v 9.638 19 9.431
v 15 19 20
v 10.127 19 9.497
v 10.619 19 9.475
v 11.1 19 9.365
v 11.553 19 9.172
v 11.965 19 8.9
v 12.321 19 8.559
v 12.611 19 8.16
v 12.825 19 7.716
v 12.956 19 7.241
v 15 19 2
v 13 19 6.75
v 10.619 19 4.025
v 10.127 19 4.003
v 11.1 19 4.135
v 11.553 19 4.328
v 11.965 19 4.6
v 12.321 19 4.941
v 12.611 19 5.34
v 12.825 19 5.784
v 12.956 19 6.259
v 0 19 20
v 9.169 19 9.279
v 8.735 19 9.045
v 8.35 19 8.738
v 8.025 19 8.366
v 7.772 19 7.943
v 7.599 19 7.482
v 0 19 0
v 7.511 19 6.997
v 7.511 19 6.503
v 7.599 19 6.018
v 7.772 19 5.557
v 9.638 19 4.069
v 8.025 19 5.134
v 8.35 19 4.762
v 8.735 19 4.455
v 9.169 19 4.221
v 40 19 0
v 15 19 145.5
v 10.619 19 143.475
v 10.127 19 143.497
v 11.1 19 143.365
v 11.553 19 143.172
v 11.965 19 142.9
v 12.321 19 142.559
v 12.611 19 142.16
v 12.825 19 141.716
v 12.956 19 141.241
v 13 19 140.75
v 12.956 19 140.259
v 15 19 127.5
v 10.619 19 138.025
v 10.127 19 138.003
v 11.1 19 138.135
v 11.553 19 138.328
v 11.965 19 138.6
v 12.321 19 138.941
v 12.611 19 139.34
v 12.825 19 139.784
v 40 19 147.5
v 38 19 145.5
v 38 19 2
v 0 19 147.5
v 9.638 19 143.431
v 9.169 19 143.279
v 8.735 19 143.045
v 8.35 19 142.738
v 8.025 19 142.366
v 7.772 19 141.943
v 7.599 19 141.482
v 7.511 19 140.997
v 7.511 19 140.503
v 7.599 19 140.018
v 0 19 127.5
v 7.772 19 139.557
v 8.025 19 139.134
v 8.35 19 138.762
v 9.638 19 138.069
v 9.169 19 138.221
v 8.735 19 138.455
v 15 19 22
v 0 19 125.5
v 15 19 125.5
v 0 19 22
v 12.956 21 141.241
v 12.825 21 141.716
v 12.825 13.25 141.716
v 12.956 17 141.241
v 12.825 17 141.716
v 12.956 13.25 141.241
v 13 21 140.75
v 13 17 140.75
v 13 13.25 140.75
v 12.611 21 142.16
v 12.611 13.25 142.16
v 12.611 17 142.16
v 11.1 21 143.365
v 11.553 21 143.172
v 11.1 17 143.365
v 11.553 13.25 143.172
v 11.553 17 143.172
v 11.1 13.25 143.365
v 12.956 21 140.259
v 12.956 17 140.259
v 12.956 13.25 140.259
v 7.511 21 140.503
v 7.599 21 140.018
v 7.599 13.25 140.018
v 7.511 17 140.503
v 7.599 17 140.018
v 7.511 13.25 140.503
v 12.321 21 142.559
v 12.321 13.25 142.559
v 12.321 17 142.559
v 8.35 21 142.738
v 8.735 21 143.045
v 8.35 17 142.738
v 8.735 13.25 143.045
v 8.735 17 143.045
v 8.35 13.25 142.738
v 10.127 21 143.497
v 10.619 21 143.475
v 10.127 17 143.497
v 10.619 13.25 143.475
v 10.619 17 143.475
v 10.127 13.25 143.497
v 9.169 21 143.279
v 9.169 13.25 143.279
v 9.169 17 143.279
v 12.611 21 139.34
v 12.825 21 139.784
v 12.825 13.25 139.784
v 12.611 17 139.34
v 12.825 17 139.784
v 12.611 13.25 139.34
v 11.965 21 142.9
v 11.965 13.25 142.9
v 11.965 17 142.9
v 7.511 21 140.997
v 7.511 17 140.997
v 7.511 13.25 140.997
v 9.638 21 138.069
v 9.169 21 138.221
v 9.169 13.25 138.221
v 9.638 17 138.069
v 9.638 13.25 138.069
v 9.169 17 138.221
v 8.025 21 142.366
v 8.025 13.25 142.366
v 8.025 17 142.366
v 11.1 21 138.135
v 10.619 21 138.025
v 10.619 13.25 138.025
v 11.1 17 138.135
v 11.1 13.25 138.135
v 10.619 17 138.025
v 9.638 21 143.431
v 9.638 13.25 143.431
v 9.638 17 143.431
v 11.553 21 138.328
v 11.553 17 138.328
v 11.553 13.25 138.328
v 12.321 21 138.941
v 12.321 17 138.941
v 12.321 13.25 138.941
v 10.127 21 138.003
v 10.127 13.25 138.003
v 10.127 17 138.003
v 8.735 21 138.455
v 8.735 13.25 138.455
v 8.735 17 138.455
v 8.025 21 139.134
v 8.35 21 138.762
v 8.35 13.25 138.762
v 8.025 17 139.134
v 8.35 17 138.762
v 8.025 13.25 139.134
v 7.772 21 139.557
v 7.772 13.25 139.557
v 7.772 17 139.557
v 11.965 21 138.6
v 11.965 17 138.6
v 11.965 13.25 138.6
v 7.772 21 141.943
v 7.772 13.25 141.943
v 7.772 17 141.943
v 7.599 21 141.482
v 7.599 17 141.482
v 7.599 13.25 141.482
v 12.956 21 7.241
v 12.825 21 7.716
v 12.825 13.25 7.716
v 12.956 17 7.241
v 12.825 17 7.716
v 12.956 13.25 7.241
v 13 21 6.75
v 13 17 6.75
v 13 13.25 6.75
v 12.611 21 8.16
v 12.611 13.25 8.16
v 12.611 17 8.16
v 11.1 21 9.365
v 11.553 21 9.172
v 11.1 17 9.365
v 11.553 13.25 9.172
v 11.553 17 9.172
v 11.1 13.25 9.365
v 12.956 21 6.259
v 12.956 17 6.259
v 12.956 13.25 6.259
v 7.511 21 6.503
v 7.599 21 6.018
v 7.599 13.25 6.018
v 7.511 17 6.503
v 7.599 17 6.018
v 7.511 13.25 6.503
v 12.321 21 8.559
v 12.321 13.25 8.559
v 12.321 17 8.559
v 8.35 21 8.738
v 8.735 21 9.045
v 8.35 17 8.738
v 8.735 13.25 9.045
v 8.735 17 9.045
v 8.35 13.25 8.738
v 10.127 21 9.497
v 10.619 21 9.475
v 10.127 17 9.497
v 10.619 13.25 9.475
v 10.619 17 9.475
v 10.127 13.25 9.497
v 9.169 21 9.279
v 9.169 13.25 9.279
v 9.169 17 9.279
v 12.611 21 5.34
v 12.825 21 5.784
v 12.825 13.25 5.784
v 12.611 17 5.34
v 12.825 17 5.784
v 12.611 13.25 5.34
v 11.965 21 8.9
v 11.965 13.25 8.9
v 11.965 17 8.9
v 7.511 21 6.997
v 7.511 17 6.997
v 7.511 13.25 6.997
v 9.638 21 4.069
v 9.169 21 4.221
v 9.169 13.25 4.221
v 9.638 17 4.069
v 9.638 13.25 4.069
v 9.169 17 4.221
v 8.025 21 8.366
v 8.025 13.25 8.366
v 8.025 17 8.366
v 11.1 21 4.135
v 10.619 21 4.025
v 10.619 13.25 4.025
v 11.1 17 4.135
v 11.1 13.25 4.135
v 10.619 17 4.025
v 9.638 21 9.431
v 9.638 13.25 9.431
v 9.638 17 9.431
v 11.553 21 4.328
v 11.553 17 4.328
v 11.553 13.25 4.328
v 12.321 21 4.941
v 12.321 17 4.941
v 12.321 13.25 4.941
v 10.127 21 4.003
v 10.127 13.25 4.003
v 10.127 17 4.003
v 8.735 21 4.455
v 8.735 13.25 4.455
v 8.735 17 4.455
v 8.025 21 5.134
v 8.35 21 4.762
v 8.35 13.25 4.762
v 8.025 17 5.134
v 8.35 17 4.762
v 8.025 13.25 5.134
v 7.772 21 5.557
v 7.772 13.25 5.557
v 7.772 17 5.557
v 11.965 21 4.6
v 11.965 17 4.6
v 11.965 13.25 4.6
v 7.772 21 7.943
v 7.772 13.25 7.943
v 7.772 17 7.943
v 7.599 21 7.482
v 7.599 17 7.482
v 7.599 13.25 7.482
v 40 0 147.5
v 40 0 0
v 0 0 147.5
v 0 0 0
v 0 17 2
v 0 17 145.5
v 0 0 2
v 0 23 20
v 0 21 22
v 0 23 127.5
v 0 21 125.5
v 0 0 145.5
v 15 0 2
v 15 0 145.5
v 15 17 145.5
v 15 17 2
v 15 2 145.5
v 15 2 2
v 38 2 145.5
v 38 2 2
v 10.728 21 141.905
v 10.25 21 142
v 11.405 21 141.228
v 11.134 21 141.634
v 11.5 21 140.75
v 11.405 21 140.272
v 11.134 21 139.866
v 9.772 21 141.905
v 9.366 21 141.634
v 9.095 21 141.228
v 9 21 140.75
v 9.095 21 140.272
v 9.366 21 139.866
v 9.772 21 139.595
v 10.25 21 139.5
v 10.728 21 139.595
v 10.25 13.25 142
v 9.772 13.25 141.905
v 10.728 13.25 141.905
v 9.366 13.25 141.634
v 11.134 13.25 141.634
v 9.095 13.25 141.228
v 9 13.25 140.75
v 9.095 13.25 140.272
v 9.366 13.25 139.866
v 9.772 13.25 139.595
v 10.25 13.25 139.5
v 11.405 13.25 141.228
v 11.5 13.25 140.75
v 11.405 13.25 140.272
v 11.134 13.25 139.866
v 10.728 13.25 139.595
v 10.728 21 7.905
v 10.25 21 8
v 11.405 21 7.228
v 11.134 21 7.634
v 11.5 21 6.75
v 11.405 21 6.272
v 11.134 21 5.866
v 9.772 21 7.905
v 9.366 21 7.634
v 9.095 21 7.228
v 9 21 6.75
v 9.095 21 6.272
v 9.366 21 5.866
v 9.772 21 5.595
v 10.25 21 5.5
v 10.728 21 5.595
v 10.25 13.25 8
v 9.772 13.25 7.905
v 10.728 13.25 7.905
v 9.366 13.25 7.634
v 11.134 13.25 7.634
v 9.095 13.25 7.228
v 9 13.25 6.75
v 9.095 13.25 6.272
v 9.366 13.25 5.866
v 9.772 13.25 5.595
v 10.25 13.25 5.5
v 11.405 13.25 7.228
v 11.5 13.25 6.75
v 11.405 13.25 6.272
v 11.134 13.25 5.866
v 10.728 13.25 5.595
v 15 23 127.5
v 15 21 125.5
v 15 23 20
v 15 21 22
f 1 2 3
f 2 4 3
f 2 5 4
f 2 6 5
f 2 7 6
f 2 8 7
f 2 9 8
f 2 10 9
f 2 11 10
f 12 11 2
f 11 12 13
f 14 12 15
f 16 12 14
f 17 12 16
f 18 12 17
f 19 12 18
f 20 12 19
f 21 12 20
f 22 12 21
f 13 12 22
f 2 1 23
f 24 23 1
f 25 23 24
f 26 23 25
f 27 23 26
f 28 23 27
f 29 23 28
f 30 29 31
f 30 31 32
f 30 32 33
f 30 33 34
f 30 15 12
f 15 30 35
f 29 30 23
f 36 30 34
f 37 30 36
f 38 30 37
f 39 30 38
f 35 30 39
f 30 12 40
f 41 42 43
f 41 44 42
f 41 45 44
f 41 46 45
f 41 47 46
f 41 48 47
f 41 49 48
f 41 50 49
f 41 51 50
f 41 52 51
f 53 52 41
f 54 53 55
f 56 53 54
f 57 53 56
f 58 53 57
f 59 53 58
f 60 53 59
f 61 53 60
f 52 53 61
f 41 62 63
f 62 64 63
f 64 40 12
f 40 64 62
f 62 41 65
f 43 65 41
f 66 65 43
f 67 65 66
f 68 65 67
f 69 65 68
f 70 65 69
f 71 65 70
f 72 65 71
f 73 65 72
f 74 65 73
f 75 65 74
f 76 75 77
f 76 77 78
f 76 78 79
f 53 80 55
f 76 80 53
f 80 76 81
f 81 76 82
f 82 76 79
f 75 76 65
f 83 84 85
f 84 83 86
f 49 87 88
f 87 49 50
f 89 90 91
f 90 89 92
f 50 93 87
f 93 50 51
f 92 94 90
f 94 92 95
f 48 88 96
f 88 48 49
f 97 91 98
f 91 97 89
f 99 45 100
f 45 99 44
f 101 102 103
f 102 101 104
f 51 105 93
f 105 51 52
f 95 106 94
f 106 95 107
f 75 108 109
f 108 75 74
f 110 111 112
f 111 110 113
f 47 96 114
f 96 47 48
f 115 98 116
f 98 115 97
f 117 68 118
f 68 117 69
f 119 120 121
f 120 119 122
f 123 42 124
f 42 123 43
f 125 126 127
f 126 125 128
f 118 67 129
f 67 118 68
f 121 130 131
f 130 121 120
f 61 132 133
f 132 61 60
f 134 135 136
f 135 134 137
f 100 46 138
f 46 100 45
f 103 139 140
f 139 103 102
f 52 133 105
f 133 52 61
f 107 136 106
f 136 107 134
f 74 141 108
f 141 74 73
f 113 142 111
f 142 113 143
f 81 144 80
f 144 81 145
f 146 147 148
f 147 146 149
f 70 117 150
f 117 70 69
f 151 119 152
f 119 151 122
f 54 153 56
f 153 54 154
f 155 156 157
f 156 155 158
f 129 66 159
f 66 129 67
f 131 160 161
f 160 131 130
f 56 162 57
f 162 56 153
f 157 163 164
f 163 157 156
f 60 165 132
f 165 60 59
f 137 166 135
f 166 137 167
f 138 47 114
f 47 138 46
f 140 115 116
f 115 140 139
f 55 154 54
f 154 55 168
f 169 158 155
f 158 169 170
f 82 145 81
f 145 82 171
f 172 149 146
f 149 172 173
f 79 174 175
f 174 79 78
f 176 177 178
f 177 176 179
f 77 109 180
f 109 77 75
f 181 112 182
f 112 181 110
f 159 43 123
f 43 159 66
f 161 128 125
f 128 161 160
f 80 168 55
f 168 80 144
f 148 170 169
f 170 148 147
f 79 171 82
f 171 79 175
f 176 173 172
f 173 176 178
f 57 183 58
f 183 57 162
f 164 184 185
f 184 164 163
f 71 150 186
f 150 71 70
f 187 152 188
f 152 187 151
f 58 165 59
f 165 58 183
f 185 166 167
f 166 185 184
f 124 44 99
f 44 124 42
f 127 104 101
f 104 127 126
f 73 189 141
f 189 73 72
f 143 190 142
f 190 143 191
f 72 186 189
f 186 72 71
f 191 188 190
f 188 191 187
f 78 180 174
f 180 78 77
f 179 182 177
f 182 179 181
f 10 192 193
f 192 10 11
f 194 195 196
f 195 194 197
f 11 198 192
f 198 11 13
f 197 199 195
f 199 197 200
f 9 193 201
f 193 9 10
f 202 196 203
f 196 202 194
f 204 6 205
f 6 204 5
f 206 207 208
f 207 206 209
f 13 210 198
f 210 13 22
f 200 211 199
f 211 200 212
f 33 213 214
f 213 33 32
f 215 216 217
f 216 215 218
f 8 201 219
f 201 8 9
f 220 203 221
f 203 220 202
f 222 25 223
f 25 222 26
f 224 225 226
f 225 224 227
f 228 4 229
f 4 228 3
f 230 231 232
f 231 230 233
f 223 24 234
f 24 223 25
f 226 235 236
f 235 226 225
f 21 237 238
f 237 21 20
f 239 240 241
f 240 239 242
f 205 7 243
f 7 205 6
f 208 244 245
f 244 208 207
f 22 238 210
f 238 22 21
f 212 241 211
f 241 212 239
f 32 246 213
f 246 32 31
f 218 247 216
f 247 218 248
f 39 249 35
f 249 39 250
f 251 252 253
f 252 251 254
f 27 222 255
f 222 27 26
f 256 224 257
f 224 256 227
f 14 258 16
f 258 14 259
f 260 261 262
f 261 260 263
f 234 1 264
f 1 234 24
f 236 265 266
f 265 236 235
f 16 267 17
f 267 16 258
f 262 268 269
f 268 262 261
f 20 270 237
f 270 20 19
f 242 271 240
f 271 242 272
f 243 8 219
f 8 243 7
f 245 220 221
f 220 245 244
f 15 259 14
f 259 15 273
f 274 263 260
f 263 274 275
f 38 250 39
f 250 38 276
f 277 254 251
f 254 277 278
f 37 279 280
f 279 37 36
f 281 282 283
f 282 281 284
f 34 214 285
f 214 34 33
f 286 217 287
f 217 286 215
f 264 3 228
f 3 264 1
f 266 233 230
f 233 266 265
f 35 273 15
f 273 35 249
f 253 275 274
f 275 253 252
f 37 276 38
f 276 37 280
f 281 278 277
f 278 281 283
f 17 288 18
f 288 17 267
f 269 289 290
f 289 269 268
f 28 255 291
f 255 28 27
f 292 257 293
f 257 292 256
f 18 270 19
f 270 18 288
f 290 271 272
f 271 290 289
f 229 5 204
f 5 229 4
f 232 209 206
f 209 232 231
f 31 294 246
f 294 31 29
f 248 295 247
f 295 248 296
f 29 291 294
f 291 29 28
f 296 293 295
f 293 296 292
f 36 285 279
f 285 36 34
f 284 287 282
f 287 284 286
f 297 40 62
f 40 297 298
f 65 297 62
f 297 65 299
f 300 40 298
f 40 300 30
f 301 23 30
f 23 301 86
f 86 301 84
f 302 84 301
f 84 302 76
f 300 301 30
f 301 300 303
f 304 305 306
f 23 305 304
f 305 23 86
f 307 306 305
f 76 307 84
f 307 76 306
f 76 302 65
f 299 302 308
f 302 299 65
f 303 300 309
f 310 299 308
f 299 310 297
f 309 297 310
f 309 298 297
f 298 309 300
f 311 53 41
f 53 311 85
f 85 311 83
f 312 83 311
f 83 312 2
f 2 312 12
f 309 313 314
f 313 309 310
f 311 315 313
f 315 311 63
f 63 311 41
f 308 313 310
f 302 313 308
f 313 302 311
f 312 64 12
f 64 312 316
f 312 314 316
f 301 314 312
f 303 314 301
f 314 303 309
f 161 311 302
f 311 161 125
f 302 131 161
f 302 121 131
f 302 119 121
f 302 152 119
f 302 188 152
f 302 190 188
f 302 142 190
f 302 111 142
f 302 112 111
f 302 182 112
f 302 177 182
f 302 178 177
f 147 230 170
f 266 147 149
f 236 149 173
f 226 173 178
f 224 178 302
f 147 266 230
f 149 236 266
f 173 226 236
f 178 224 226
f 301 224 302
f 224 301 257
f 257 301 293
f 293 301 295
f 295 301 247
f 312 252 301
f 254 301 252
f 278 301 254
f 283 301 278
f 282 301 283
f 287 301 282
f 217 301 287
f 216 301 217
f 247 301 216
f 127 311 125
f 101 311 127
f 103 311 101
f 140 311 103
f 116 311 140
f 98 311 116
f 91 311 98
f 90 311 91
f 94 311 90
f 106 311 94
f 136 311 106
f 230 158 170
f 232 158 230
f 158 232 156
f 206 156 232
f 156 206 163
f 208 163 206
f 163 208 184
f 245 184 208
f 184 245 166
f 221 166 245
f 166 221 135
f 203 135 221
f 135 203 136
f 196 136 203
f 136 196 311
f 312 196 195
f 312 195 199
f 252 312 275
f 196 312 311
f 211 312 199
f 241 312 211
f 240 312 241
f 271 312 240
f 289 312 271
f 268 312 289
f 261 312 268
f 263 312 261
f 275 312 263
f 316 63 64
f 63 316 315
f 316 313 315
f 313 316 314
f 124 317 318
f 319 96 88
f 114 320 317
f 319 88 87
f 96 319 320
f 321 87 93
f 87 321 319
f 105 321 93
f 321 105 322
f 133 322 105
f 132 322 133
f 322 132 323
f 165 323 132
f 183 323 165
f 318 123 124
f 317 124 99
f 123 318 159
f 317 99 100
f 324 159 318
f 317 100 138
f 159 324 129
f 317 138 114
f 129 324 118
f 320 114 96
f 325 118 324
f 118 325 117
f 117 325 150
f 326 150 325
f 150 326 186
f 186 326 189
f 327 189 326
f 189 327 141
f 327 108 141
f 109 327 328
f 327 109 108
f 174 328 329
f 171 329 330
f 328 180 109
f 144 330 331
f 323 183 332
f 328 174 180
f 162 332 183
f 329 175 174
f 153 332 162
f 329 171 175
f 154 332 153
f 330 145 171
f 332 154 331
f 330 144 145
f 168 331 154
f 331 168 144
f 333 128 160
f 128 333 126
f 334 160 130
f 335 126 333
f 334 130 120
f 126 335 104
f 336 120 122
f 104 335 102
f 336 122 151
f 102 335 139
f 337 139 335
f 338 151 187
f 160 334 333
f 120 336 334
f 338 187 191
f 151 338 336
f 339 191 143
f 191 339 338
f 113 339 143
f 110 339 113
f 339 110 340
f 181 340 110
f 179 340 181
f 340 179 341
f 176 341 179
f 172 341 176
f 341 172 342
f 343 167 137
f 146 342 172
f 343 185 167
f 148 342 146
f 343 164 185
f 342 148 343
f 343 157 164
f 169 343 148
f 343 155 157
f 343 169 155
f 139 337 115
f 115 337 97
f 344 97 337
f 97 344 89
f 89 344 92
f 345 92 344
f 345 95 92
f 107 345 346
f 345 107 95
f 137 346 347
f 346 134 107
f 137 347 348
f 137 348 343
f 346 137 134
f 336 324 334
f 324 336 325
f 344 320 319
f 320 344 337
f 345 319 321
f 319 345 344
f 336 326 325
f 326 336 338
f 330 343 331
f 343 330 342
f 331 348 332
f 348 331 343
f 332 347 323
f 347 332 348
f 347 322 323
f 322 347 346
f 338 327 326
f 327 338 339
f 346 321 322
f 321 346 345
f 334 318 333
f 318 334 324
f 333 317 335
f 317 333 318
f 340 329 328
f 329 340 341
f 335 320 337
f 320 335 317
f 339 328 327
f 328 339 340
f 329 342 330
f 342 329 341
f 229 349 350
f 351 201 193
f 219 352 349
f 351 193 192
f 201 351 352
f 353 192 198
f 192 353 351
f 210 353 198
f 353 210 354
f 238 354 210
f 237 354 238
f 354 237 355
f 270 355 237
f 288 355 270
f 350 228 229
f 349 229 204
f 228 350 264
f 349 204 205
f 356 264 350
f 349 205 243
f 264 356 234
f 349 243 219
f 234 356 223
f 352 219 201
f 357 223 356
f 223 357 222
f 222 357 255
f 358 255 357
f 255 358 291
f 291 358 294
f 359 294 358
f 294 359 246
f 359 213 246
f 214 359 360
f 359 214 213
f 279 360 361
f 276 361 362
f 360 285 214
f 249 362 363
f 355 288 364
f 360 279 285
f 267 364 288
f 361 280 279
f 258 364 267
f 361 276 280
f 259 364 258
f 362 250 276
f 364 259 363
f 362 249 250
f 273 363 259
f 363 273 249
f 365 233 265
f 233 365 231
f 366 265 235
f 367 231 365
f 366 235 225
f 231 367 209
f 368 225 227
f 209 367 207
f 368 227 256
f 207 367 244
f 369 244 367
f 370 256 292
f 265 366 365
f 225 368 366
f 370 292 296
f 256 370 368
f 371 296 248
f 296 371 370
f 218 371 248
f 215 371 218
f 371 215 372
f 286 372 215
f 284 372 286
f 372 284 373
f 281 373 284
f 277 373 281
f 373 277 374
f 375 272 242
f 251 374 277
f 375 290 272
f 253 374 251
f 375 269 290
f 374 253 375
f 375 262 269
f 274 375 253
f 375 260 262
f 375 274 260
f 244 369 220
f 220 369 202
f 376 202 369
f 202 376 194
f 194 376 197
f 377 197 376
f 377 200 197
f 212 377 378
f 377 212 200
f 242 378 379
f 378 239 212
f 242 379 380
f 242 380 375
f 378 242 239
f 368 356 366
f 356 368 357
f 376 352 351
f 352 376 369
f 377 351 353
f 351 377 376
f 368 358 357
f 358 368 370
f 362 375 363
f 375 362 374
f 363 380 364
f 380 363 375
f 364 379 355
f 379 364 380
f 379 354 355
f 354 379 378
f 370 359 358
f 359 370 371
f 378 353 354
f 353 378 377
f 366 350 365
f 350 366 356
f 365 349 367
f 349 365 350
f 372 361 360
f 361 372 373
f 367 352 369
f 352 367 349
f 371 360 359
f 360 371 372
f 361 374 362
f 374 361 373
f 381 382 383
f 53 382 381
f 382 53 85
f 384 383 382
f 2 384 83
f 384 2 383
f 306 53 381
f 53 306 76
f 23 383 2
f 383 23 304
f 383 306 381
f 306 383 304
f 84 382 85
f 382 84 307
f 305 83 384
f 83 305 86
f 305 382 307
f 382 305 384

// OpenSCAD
$fs = 0.5;
$fa = 0.5;

width = 40;
height = 147.5;
depth = 19;
screenSize = 15;
thickness = 2;

pegWidth = 2.75;
pegHeight = 3.75;
pegNegativeHeight = 2;
pegScrewSize = 1.25;
pegOffset = pegWidth + 2;

union() {
    sleeve(width, height, depth, screenSize, thickness);
    rotate([90, 0, 0]) {
            translate([screenSize-pegOffset, height-pegOffset-thickness, -depth-pegNegativeHeight]) peg(pegWidth, pegHeight+pegNegativeHeight+thickness, pegScrewSize);
            translate([screenSize-pegOffset, pegOffset+thickness, -depth-pegNegativeHeight]) peg(pegWidth, pegHeight+pegNegativeHeight+thickness, pegScrewSize);
    };
    translate([0, depth, CENTER(height, height-40)]) attachment(screenSize, height-40, 2*thickness, thickness);
}

module sleeve(width, height, depth, screenSize, thickness) {
    difference() {
        cube([width, depth, height]);

        #translate([0,0,CENTER(height, height-thickness*2)]) cube([width - 25, depth - thickness, height - thickness*2]);

        #translate([screenSize, thickness, CENTER(height, height-thickness*2)]) cube([width - screenSize-thickness, depth - thickness, height - thickness*2]);

        #rotate([90, 0, 0]) {
            translate([screenSize-pegOffset, height-pegOffset-thickness, -depth]) pegHole(pegWidth, pegHeight+pegNegativeHeight, pegScrewSize);
            translate([screenSize-pegOffset, pegOffset+thickness, -depth]) pegHole(pegWidth, pegHeight+pegNegativeHeight, pegScrewSize);
    };
    }
}

module attachment(width, height, depth, thickness) {
    difference() {
        cube([width, depth, height]);
        #translate([0, 0, CENTER(height, height-thickness*2)]) cube([width, depth-thickness, height-thickness*2]);
    }
}

module peg(width, height, screwSize) {
    difference() {
        cylinder(r=width, h=height);
        cylinder(r=screwSize, h=height);
    }
}

module pegHole(width, height, screwSize) {
        cylinder(r=screwSize, h=height+1);
        cylinder(r=width, h=height);
}

function CENTER(parentCoordinate, childCoordinate) = 
    parentCoordinate / 2 - childCoordinate / 2;
